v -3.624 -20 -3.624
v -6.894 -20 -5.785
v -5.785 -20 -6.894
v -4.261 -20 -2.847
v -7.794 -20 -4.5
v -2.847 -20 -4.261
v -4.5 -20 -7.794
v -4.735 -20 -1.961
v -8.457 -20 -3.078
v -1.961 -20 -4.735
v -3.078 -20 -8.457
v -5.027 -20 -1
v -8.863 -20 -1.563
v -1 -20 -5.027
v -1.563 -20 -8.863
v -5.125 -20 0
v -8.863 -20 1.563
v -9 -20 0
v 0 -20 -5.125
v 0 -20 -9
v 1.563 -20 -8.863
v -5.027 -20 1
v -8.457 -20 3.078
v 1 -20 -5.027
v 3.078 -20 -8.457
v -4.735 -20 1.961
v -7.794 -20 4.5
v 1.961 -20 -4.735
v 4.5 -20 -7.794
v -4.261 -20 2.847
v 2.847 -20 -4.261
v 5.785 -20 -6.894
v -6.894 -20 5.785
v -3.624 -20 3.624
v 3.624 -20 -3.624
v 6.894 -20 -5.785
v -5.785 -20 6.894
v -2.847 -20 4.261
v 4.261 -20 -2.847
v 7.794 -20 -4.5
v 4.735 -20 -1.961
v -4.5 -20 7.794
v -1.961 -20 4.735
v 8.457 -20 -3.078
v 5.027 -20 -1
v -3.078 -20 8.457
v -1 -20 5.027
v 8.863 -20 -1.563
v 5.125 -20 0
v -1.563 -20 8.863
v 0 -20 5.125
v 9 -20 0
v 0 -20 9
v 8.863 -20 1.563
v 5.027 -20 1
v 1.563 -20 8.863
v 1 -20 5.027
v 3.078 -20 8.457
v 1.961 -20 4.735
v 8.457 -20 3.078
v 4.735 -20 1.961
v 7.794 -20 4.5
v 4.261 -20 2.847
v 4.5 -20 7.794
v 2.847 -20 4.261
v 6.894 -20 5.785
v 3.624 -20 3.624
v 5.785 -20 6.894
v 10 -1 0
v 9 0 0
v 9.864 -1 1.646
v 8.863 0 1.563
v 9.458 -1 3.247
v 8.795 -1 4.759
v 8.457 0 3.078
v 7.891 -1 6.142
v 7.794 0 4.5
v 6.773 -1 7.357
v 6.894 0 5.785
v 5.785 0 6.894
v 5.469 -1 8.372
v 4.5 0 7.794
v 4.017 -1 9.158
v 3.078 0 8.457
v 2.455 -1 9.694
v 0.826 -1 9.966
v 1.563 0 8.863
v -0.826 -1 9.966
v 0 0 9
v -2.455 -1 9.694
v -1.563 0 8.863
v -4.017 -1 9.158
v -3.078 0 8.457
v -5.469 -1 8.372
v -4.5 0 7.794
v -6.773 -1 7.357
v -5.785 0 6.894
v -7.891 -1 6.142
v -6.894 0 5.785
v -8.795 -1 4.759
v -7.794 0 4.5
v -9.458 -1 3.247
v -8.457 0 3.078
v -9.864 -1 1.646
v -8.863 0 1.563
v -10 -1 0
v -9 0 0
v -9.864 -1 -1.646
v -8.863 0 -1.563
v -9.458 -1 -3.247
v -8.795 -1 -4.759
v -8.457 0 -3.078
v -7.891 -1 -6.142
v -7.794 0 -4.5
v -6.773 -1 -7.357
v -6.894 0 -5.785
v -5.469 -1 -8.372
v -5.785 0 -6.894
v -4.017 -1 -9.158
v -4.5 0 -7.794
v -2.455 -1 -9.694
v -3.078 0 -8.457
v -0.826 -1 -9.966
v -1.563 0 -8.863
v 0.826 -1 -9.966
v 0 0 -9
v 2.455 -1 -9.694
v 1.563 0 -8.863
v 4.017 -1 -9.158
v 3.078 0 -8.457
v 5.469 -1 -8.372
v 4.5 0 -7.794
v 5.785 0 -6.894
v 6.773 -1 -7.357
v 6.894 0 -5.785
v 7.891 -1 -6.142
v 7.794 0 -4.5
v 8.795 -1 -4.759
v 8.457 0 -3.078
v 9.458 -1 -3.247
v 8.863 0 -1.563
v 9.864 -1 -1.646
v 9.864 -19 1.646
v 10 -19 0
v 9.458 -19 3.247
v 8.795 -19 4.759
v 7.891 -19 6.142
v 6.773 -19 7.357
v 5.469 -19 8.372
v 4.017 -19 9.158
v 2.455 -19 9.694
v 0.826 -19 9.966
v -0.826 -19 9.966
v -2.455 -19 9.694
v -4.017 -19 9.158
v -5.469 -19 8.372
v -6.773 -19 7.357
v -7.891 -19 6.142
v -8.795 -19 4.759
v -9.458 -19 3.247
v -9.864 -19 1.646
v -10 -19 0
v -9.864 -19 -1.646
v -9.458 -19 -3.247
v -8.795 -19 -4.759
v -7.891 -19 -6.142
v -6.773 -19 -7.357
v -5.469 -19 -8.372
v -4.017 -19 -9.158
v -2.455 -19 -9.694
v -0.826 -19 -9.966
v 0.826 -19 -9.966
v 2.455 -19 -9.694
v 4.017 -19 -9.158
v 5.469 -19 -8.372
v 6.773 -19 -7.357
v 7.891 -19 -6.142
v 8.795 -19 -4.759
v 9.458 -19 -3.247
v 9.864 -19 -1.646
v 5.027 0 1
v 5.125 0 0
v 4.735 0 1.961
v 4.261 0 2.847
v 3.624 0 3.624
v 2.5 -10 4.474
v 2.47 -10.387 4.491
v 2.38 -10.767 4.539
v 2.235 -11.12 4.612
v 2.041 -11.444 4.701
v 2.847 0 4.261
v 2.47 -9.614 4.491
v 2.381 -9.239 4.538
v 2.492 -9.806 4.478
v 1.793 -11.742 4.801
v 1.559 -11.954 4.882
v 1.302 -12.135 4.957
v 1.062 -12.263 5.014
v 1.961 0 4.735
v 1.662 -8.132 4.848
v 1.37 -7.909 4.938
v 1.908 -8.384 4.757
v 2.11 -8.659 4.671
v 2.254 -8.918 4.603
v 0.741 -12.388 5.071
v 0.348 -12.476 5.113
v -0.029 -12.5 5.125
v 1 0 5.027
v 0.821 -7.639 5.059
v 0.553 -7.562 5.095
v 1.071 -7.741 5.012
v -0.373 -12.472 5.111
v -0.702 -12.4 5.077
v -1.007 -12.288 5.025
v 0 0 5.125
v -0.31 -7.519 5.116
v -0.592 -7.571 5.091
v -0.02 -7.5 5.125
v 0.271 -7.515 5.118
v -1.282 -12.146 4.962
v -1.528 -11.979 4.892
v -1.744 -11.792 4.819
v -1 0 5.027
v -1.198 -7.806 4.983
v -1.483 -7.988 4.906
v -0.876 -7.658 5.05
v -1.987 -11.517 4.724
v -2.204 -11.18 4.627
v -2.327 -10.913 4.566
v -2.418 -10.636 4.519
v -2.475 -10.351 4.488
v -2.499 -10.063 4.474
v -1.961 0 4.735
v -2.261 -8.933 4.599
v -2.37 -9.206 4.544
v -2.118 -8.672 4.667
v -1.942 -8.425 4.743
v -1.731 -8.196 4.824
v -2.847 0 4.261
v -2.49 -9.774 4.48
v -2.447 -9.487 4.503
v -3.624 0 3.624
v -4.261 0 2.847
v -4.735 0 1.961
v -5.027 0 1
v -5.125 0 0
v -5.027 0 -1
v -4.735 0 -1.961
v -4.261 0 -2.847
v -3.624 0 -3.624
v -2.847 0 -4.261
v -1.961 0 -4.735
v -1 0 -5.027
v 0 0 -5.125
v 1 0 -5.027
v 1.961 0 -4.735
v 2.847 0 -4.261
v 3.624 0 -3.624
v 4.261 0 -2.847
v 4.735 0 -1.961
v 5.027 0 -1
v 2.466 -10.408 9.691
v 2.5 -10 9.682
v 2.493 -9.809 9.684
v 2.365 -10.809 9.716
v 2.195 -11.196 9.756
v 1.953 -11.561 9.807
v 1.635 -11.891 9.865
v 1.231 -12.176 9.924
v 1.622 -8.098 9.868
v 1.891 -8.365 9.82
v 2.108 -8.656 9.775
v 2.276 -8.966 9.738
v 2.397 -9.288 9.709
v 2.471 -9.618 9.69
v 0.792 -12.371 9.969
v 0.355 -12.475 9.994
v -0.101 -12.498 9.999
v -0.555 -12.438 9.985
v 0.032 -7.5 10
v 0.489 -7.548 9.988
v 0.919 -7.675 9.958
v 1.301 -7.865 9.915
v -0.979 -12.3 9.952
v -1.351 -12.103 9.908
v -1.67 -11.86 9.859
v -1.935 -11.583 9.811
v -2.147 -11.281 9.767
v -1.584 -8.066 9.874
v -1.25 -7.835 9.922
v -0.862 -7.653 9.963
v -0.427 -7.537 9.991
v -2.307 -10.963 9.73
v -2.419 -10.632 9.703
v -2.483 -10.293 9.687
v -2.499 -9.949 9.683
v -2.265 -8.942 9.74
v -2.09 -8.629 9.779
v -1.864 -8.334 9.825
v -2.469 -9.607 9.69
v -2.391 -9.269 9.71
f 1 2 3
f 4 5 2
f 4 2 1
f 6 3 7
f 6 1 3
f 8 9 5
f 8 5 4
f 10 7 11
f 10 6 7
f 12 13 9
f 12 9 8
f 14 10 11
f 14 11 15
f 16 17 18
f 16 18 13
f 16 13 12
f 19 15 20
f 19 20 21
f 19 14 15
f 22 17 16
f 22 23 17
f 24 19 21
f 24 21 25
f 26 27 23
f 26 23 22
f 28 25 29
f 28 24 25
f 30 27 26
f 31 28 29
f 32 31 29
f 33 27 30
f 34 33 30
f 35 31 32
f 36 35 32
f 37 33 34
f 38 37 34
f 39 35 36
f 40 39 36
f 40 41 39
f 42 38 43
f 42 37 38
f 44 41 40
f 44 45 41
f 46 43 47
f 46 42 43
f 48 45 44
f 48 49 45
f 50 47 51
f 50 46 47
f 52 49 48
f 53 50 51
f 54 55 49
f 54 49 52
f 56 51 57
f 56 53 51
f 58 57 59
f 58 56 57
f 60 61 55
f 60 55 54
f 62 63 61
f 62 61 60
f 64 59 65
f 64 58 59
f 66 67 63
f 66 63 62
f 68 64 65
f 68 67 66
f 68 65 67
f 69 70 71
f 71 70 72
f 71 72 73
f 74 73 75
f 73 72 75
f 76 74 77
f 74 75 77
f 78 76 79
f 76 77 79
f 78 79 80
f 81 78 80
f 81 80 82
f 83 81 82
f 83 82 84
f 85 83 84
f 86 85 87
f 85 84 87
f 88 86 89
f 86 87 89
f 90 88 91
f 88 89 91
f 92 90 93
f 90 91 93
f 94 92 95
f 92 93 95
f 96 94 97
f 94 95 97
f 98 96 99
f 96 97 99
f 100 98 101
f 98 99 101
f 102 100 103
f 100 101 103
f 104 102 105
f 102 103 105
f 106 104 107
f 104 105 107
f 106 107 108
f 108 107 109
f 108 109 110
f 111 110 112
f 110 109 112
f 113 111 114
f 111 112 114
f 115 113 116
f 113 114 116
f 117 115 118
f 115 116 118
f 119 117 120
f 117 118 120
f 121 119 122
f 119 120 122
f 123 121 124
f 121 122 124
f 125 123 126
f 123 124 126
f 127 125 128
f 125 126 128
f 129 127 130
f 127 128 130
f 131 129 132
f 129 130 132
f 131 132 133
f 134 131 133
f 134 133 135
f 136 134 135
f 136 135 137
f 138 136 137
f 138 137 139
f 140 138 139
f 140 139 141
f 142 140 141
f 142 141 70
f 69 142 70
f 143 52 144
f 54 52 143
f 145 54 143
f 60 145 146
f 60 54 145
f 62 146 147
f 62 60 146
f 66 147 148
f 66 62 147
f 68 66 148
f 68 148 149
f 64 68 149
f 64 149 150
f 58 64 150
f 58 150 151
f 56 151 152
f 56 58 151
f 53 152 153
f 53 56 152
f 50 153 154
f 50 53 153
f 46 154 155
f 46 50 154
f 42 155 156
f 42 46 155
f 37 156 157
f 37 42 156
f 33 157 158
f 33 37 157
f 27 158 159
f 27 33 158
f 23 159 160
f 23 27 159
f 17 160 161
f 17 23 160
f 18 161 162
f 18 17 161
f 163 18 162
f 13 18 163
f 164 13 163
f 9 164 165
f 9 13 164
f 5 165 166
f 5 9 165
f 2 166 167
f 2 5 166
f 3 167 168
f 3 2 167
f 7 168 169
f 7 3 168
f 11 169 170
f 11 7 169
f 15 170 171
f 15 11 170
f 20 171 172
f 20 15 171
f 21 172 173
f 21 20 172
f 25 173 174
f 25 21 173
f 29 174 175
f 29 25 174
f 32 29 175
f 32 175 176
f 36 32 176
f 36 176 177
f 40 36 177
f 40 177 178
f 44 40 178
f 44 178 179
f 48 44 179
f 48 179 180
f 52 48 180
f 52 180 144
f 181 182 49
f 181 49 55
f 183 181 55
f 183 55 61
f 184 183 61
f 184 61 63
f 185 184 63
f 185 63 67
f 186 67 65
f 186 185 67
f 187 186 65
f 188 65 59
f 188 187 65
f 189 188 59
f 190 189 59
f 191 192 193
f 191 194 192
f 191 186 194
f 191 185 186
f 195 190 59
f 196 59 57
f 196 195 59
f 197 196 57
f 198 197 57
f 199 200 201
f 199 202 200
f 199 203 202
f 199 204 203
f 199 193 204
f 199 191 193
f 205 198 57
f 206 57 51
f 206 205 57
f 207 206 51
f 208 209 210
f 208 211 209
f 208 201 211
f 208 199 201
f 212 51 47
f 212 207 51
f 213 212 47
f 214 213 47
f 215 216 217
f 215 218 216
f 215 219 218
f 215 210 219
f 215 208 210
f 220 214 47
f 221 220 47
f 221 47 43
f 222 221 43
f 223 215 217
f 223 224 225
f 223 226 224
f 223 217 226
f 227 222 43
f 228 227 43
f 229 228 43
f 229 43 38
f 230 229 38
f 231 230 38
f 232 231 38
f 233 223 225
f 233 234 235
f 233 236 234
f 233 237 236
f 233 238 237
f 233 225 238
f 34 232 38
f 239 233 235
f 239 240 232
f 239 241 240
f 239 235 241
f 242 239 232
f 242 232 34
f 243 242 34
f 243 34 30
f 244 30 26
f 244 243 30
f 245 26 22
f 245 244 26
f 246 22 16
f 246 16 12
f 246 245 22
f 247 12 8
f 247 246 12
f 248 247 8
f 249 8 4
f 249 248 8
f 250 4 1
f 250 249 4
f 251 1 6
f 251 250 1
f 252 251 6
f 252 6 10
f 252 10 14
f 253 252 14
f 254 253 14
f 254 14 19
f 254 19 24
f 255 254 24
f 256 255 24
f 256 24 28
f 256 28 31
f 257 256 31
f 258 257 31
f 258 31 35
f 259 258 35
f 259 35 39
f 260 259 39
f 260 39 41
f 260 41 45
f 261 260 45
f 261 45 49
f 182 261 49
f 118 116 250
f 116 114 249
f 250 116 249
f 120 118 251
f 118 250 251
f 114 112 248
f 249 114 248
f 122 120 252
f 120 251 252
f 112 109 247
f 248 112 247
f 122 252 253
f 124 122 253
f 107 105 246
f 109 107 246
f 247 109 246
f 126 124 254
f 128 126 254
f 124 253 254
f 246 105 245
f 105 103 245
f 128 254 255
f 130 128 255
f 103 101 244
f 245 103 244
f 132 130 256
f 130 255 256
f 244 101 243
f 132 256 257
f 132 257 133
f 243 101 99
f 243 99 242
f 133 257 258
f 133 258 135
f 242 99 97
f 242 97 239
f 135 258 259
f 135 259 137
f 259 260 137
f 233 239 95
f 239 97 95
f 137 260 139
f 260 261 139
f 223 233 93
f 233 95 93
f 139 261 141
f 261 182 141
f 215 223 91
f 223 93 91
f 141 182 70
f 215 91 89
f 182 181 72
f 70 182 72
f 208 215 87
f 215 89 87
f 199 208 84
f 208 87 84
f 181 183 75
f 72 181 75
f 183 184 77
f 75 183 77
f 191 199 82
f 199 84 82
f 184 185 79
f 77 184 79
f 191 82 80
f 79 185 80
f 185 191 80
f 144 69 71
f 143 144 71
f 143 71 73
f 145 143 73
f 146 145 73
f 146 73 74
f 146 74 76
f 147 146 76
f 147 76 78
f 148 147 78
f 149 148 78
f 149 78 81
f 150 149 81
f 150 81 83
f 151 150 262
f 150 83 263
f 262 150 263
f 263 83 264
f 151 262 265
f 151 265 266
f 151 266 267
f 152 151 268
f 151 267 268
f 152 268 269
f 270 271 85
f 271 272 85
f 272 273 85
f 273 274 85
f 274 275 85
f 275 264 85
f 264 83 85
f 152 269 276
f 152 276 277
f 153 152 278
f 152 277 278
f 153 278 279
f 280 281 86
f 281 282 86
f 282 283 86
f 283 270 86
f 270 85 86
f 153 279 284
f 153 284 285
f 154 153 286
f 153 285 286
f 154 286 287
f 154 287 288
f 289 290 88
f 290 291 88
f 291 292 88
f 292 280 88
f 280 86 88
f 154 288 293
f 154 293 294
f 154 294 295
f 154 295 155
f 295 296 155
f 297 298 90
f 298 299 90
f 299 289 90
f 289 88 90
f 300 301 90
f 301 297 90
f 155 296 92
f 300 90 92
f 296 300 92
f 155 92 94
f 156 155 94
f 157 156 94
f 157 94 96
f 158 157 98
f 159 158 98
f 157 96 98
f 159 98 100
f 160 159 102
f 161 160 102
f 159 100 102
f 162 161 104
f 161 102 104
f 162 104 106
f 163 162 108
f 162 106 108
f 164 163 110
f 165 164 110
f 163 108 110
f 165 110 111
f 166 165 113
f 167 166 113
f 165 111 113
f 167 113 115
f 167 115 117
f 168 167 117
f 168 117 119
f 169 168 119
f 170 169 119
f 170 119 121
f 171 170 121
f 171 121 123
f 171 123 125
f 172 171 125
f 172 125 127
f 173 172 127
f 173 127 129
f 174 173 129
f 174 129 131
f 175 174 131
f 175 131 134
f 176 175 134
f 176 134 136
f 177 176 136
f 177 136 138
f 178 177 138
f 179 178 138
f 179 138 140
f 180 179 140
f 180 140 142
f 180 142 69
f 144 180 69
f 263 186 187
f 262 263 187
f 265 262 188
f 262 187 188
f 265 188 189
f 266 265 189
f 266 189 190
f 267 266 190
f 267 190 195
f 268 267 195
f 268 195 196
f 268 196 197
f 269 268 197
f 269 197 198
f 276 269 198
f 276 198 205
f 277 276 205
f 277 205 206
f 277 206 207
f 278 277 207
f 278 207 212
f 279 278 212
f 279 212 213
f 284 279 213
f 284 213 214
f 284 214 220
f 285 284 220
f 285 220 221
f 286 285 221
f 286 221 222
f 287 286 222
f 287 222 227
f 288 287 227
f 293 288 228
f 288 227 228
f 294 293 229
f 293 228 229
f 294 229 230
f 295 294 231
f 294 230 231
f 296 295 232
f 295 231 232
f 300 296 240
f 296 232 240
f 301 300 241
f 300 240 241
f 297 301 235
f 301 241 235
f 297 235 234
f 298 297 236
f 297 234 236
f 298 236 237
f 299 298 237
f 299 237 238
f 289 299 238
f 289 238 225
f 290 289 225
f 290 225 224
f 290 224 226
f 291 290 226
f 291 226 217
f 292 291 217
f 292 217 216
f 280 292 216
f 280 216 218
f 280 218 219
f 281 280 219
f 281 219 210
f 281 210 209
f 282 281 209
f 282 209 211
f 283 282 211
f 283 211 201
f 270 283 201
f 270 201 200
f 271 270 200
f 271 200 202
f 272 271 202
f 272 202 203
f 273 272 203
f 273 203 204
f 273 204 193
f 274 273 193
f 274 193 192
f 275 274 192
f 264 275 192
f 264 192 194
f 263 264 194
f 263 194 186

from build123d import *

# Parameters (mm, degrees)
F0_R     = 10
F0_R_2   = 5.125
F1_DEPTH = 20
F3_D     = 5
F3_DEPTH = 10.001
F4_SIZE  = 1


with BuildPart() as f1:
    # F0 (on Front) → F1 (new body)
    with BuildSketch(Plane.XZ):
        Circle(F0_R)
        Circle(F0_R_2, mode=Mode.SUBTRACT)
    extrude(amount=F1_DEPTH)

    # F3 (through all, one way)
    with BuildSketch(Plane(origin=(0, 0, 0), x_dir=(1, 0, 0), z_dir=(0, 0, -1))):
        with Locations((0, 10)):
            Circle(F3_D / 2)
    extrude(amount=-F3_DEPTH, mode=Mode.SUBTRACT)

    # F4
    f4_edges = [f1.edges().sort_by_distance(p)[0] for p in [
        (-10, -20, 0),
        (-10, 0, 0),
    ]]
    chamfer(f4_edges, length=F4_SIZE)


solid = f1.part
